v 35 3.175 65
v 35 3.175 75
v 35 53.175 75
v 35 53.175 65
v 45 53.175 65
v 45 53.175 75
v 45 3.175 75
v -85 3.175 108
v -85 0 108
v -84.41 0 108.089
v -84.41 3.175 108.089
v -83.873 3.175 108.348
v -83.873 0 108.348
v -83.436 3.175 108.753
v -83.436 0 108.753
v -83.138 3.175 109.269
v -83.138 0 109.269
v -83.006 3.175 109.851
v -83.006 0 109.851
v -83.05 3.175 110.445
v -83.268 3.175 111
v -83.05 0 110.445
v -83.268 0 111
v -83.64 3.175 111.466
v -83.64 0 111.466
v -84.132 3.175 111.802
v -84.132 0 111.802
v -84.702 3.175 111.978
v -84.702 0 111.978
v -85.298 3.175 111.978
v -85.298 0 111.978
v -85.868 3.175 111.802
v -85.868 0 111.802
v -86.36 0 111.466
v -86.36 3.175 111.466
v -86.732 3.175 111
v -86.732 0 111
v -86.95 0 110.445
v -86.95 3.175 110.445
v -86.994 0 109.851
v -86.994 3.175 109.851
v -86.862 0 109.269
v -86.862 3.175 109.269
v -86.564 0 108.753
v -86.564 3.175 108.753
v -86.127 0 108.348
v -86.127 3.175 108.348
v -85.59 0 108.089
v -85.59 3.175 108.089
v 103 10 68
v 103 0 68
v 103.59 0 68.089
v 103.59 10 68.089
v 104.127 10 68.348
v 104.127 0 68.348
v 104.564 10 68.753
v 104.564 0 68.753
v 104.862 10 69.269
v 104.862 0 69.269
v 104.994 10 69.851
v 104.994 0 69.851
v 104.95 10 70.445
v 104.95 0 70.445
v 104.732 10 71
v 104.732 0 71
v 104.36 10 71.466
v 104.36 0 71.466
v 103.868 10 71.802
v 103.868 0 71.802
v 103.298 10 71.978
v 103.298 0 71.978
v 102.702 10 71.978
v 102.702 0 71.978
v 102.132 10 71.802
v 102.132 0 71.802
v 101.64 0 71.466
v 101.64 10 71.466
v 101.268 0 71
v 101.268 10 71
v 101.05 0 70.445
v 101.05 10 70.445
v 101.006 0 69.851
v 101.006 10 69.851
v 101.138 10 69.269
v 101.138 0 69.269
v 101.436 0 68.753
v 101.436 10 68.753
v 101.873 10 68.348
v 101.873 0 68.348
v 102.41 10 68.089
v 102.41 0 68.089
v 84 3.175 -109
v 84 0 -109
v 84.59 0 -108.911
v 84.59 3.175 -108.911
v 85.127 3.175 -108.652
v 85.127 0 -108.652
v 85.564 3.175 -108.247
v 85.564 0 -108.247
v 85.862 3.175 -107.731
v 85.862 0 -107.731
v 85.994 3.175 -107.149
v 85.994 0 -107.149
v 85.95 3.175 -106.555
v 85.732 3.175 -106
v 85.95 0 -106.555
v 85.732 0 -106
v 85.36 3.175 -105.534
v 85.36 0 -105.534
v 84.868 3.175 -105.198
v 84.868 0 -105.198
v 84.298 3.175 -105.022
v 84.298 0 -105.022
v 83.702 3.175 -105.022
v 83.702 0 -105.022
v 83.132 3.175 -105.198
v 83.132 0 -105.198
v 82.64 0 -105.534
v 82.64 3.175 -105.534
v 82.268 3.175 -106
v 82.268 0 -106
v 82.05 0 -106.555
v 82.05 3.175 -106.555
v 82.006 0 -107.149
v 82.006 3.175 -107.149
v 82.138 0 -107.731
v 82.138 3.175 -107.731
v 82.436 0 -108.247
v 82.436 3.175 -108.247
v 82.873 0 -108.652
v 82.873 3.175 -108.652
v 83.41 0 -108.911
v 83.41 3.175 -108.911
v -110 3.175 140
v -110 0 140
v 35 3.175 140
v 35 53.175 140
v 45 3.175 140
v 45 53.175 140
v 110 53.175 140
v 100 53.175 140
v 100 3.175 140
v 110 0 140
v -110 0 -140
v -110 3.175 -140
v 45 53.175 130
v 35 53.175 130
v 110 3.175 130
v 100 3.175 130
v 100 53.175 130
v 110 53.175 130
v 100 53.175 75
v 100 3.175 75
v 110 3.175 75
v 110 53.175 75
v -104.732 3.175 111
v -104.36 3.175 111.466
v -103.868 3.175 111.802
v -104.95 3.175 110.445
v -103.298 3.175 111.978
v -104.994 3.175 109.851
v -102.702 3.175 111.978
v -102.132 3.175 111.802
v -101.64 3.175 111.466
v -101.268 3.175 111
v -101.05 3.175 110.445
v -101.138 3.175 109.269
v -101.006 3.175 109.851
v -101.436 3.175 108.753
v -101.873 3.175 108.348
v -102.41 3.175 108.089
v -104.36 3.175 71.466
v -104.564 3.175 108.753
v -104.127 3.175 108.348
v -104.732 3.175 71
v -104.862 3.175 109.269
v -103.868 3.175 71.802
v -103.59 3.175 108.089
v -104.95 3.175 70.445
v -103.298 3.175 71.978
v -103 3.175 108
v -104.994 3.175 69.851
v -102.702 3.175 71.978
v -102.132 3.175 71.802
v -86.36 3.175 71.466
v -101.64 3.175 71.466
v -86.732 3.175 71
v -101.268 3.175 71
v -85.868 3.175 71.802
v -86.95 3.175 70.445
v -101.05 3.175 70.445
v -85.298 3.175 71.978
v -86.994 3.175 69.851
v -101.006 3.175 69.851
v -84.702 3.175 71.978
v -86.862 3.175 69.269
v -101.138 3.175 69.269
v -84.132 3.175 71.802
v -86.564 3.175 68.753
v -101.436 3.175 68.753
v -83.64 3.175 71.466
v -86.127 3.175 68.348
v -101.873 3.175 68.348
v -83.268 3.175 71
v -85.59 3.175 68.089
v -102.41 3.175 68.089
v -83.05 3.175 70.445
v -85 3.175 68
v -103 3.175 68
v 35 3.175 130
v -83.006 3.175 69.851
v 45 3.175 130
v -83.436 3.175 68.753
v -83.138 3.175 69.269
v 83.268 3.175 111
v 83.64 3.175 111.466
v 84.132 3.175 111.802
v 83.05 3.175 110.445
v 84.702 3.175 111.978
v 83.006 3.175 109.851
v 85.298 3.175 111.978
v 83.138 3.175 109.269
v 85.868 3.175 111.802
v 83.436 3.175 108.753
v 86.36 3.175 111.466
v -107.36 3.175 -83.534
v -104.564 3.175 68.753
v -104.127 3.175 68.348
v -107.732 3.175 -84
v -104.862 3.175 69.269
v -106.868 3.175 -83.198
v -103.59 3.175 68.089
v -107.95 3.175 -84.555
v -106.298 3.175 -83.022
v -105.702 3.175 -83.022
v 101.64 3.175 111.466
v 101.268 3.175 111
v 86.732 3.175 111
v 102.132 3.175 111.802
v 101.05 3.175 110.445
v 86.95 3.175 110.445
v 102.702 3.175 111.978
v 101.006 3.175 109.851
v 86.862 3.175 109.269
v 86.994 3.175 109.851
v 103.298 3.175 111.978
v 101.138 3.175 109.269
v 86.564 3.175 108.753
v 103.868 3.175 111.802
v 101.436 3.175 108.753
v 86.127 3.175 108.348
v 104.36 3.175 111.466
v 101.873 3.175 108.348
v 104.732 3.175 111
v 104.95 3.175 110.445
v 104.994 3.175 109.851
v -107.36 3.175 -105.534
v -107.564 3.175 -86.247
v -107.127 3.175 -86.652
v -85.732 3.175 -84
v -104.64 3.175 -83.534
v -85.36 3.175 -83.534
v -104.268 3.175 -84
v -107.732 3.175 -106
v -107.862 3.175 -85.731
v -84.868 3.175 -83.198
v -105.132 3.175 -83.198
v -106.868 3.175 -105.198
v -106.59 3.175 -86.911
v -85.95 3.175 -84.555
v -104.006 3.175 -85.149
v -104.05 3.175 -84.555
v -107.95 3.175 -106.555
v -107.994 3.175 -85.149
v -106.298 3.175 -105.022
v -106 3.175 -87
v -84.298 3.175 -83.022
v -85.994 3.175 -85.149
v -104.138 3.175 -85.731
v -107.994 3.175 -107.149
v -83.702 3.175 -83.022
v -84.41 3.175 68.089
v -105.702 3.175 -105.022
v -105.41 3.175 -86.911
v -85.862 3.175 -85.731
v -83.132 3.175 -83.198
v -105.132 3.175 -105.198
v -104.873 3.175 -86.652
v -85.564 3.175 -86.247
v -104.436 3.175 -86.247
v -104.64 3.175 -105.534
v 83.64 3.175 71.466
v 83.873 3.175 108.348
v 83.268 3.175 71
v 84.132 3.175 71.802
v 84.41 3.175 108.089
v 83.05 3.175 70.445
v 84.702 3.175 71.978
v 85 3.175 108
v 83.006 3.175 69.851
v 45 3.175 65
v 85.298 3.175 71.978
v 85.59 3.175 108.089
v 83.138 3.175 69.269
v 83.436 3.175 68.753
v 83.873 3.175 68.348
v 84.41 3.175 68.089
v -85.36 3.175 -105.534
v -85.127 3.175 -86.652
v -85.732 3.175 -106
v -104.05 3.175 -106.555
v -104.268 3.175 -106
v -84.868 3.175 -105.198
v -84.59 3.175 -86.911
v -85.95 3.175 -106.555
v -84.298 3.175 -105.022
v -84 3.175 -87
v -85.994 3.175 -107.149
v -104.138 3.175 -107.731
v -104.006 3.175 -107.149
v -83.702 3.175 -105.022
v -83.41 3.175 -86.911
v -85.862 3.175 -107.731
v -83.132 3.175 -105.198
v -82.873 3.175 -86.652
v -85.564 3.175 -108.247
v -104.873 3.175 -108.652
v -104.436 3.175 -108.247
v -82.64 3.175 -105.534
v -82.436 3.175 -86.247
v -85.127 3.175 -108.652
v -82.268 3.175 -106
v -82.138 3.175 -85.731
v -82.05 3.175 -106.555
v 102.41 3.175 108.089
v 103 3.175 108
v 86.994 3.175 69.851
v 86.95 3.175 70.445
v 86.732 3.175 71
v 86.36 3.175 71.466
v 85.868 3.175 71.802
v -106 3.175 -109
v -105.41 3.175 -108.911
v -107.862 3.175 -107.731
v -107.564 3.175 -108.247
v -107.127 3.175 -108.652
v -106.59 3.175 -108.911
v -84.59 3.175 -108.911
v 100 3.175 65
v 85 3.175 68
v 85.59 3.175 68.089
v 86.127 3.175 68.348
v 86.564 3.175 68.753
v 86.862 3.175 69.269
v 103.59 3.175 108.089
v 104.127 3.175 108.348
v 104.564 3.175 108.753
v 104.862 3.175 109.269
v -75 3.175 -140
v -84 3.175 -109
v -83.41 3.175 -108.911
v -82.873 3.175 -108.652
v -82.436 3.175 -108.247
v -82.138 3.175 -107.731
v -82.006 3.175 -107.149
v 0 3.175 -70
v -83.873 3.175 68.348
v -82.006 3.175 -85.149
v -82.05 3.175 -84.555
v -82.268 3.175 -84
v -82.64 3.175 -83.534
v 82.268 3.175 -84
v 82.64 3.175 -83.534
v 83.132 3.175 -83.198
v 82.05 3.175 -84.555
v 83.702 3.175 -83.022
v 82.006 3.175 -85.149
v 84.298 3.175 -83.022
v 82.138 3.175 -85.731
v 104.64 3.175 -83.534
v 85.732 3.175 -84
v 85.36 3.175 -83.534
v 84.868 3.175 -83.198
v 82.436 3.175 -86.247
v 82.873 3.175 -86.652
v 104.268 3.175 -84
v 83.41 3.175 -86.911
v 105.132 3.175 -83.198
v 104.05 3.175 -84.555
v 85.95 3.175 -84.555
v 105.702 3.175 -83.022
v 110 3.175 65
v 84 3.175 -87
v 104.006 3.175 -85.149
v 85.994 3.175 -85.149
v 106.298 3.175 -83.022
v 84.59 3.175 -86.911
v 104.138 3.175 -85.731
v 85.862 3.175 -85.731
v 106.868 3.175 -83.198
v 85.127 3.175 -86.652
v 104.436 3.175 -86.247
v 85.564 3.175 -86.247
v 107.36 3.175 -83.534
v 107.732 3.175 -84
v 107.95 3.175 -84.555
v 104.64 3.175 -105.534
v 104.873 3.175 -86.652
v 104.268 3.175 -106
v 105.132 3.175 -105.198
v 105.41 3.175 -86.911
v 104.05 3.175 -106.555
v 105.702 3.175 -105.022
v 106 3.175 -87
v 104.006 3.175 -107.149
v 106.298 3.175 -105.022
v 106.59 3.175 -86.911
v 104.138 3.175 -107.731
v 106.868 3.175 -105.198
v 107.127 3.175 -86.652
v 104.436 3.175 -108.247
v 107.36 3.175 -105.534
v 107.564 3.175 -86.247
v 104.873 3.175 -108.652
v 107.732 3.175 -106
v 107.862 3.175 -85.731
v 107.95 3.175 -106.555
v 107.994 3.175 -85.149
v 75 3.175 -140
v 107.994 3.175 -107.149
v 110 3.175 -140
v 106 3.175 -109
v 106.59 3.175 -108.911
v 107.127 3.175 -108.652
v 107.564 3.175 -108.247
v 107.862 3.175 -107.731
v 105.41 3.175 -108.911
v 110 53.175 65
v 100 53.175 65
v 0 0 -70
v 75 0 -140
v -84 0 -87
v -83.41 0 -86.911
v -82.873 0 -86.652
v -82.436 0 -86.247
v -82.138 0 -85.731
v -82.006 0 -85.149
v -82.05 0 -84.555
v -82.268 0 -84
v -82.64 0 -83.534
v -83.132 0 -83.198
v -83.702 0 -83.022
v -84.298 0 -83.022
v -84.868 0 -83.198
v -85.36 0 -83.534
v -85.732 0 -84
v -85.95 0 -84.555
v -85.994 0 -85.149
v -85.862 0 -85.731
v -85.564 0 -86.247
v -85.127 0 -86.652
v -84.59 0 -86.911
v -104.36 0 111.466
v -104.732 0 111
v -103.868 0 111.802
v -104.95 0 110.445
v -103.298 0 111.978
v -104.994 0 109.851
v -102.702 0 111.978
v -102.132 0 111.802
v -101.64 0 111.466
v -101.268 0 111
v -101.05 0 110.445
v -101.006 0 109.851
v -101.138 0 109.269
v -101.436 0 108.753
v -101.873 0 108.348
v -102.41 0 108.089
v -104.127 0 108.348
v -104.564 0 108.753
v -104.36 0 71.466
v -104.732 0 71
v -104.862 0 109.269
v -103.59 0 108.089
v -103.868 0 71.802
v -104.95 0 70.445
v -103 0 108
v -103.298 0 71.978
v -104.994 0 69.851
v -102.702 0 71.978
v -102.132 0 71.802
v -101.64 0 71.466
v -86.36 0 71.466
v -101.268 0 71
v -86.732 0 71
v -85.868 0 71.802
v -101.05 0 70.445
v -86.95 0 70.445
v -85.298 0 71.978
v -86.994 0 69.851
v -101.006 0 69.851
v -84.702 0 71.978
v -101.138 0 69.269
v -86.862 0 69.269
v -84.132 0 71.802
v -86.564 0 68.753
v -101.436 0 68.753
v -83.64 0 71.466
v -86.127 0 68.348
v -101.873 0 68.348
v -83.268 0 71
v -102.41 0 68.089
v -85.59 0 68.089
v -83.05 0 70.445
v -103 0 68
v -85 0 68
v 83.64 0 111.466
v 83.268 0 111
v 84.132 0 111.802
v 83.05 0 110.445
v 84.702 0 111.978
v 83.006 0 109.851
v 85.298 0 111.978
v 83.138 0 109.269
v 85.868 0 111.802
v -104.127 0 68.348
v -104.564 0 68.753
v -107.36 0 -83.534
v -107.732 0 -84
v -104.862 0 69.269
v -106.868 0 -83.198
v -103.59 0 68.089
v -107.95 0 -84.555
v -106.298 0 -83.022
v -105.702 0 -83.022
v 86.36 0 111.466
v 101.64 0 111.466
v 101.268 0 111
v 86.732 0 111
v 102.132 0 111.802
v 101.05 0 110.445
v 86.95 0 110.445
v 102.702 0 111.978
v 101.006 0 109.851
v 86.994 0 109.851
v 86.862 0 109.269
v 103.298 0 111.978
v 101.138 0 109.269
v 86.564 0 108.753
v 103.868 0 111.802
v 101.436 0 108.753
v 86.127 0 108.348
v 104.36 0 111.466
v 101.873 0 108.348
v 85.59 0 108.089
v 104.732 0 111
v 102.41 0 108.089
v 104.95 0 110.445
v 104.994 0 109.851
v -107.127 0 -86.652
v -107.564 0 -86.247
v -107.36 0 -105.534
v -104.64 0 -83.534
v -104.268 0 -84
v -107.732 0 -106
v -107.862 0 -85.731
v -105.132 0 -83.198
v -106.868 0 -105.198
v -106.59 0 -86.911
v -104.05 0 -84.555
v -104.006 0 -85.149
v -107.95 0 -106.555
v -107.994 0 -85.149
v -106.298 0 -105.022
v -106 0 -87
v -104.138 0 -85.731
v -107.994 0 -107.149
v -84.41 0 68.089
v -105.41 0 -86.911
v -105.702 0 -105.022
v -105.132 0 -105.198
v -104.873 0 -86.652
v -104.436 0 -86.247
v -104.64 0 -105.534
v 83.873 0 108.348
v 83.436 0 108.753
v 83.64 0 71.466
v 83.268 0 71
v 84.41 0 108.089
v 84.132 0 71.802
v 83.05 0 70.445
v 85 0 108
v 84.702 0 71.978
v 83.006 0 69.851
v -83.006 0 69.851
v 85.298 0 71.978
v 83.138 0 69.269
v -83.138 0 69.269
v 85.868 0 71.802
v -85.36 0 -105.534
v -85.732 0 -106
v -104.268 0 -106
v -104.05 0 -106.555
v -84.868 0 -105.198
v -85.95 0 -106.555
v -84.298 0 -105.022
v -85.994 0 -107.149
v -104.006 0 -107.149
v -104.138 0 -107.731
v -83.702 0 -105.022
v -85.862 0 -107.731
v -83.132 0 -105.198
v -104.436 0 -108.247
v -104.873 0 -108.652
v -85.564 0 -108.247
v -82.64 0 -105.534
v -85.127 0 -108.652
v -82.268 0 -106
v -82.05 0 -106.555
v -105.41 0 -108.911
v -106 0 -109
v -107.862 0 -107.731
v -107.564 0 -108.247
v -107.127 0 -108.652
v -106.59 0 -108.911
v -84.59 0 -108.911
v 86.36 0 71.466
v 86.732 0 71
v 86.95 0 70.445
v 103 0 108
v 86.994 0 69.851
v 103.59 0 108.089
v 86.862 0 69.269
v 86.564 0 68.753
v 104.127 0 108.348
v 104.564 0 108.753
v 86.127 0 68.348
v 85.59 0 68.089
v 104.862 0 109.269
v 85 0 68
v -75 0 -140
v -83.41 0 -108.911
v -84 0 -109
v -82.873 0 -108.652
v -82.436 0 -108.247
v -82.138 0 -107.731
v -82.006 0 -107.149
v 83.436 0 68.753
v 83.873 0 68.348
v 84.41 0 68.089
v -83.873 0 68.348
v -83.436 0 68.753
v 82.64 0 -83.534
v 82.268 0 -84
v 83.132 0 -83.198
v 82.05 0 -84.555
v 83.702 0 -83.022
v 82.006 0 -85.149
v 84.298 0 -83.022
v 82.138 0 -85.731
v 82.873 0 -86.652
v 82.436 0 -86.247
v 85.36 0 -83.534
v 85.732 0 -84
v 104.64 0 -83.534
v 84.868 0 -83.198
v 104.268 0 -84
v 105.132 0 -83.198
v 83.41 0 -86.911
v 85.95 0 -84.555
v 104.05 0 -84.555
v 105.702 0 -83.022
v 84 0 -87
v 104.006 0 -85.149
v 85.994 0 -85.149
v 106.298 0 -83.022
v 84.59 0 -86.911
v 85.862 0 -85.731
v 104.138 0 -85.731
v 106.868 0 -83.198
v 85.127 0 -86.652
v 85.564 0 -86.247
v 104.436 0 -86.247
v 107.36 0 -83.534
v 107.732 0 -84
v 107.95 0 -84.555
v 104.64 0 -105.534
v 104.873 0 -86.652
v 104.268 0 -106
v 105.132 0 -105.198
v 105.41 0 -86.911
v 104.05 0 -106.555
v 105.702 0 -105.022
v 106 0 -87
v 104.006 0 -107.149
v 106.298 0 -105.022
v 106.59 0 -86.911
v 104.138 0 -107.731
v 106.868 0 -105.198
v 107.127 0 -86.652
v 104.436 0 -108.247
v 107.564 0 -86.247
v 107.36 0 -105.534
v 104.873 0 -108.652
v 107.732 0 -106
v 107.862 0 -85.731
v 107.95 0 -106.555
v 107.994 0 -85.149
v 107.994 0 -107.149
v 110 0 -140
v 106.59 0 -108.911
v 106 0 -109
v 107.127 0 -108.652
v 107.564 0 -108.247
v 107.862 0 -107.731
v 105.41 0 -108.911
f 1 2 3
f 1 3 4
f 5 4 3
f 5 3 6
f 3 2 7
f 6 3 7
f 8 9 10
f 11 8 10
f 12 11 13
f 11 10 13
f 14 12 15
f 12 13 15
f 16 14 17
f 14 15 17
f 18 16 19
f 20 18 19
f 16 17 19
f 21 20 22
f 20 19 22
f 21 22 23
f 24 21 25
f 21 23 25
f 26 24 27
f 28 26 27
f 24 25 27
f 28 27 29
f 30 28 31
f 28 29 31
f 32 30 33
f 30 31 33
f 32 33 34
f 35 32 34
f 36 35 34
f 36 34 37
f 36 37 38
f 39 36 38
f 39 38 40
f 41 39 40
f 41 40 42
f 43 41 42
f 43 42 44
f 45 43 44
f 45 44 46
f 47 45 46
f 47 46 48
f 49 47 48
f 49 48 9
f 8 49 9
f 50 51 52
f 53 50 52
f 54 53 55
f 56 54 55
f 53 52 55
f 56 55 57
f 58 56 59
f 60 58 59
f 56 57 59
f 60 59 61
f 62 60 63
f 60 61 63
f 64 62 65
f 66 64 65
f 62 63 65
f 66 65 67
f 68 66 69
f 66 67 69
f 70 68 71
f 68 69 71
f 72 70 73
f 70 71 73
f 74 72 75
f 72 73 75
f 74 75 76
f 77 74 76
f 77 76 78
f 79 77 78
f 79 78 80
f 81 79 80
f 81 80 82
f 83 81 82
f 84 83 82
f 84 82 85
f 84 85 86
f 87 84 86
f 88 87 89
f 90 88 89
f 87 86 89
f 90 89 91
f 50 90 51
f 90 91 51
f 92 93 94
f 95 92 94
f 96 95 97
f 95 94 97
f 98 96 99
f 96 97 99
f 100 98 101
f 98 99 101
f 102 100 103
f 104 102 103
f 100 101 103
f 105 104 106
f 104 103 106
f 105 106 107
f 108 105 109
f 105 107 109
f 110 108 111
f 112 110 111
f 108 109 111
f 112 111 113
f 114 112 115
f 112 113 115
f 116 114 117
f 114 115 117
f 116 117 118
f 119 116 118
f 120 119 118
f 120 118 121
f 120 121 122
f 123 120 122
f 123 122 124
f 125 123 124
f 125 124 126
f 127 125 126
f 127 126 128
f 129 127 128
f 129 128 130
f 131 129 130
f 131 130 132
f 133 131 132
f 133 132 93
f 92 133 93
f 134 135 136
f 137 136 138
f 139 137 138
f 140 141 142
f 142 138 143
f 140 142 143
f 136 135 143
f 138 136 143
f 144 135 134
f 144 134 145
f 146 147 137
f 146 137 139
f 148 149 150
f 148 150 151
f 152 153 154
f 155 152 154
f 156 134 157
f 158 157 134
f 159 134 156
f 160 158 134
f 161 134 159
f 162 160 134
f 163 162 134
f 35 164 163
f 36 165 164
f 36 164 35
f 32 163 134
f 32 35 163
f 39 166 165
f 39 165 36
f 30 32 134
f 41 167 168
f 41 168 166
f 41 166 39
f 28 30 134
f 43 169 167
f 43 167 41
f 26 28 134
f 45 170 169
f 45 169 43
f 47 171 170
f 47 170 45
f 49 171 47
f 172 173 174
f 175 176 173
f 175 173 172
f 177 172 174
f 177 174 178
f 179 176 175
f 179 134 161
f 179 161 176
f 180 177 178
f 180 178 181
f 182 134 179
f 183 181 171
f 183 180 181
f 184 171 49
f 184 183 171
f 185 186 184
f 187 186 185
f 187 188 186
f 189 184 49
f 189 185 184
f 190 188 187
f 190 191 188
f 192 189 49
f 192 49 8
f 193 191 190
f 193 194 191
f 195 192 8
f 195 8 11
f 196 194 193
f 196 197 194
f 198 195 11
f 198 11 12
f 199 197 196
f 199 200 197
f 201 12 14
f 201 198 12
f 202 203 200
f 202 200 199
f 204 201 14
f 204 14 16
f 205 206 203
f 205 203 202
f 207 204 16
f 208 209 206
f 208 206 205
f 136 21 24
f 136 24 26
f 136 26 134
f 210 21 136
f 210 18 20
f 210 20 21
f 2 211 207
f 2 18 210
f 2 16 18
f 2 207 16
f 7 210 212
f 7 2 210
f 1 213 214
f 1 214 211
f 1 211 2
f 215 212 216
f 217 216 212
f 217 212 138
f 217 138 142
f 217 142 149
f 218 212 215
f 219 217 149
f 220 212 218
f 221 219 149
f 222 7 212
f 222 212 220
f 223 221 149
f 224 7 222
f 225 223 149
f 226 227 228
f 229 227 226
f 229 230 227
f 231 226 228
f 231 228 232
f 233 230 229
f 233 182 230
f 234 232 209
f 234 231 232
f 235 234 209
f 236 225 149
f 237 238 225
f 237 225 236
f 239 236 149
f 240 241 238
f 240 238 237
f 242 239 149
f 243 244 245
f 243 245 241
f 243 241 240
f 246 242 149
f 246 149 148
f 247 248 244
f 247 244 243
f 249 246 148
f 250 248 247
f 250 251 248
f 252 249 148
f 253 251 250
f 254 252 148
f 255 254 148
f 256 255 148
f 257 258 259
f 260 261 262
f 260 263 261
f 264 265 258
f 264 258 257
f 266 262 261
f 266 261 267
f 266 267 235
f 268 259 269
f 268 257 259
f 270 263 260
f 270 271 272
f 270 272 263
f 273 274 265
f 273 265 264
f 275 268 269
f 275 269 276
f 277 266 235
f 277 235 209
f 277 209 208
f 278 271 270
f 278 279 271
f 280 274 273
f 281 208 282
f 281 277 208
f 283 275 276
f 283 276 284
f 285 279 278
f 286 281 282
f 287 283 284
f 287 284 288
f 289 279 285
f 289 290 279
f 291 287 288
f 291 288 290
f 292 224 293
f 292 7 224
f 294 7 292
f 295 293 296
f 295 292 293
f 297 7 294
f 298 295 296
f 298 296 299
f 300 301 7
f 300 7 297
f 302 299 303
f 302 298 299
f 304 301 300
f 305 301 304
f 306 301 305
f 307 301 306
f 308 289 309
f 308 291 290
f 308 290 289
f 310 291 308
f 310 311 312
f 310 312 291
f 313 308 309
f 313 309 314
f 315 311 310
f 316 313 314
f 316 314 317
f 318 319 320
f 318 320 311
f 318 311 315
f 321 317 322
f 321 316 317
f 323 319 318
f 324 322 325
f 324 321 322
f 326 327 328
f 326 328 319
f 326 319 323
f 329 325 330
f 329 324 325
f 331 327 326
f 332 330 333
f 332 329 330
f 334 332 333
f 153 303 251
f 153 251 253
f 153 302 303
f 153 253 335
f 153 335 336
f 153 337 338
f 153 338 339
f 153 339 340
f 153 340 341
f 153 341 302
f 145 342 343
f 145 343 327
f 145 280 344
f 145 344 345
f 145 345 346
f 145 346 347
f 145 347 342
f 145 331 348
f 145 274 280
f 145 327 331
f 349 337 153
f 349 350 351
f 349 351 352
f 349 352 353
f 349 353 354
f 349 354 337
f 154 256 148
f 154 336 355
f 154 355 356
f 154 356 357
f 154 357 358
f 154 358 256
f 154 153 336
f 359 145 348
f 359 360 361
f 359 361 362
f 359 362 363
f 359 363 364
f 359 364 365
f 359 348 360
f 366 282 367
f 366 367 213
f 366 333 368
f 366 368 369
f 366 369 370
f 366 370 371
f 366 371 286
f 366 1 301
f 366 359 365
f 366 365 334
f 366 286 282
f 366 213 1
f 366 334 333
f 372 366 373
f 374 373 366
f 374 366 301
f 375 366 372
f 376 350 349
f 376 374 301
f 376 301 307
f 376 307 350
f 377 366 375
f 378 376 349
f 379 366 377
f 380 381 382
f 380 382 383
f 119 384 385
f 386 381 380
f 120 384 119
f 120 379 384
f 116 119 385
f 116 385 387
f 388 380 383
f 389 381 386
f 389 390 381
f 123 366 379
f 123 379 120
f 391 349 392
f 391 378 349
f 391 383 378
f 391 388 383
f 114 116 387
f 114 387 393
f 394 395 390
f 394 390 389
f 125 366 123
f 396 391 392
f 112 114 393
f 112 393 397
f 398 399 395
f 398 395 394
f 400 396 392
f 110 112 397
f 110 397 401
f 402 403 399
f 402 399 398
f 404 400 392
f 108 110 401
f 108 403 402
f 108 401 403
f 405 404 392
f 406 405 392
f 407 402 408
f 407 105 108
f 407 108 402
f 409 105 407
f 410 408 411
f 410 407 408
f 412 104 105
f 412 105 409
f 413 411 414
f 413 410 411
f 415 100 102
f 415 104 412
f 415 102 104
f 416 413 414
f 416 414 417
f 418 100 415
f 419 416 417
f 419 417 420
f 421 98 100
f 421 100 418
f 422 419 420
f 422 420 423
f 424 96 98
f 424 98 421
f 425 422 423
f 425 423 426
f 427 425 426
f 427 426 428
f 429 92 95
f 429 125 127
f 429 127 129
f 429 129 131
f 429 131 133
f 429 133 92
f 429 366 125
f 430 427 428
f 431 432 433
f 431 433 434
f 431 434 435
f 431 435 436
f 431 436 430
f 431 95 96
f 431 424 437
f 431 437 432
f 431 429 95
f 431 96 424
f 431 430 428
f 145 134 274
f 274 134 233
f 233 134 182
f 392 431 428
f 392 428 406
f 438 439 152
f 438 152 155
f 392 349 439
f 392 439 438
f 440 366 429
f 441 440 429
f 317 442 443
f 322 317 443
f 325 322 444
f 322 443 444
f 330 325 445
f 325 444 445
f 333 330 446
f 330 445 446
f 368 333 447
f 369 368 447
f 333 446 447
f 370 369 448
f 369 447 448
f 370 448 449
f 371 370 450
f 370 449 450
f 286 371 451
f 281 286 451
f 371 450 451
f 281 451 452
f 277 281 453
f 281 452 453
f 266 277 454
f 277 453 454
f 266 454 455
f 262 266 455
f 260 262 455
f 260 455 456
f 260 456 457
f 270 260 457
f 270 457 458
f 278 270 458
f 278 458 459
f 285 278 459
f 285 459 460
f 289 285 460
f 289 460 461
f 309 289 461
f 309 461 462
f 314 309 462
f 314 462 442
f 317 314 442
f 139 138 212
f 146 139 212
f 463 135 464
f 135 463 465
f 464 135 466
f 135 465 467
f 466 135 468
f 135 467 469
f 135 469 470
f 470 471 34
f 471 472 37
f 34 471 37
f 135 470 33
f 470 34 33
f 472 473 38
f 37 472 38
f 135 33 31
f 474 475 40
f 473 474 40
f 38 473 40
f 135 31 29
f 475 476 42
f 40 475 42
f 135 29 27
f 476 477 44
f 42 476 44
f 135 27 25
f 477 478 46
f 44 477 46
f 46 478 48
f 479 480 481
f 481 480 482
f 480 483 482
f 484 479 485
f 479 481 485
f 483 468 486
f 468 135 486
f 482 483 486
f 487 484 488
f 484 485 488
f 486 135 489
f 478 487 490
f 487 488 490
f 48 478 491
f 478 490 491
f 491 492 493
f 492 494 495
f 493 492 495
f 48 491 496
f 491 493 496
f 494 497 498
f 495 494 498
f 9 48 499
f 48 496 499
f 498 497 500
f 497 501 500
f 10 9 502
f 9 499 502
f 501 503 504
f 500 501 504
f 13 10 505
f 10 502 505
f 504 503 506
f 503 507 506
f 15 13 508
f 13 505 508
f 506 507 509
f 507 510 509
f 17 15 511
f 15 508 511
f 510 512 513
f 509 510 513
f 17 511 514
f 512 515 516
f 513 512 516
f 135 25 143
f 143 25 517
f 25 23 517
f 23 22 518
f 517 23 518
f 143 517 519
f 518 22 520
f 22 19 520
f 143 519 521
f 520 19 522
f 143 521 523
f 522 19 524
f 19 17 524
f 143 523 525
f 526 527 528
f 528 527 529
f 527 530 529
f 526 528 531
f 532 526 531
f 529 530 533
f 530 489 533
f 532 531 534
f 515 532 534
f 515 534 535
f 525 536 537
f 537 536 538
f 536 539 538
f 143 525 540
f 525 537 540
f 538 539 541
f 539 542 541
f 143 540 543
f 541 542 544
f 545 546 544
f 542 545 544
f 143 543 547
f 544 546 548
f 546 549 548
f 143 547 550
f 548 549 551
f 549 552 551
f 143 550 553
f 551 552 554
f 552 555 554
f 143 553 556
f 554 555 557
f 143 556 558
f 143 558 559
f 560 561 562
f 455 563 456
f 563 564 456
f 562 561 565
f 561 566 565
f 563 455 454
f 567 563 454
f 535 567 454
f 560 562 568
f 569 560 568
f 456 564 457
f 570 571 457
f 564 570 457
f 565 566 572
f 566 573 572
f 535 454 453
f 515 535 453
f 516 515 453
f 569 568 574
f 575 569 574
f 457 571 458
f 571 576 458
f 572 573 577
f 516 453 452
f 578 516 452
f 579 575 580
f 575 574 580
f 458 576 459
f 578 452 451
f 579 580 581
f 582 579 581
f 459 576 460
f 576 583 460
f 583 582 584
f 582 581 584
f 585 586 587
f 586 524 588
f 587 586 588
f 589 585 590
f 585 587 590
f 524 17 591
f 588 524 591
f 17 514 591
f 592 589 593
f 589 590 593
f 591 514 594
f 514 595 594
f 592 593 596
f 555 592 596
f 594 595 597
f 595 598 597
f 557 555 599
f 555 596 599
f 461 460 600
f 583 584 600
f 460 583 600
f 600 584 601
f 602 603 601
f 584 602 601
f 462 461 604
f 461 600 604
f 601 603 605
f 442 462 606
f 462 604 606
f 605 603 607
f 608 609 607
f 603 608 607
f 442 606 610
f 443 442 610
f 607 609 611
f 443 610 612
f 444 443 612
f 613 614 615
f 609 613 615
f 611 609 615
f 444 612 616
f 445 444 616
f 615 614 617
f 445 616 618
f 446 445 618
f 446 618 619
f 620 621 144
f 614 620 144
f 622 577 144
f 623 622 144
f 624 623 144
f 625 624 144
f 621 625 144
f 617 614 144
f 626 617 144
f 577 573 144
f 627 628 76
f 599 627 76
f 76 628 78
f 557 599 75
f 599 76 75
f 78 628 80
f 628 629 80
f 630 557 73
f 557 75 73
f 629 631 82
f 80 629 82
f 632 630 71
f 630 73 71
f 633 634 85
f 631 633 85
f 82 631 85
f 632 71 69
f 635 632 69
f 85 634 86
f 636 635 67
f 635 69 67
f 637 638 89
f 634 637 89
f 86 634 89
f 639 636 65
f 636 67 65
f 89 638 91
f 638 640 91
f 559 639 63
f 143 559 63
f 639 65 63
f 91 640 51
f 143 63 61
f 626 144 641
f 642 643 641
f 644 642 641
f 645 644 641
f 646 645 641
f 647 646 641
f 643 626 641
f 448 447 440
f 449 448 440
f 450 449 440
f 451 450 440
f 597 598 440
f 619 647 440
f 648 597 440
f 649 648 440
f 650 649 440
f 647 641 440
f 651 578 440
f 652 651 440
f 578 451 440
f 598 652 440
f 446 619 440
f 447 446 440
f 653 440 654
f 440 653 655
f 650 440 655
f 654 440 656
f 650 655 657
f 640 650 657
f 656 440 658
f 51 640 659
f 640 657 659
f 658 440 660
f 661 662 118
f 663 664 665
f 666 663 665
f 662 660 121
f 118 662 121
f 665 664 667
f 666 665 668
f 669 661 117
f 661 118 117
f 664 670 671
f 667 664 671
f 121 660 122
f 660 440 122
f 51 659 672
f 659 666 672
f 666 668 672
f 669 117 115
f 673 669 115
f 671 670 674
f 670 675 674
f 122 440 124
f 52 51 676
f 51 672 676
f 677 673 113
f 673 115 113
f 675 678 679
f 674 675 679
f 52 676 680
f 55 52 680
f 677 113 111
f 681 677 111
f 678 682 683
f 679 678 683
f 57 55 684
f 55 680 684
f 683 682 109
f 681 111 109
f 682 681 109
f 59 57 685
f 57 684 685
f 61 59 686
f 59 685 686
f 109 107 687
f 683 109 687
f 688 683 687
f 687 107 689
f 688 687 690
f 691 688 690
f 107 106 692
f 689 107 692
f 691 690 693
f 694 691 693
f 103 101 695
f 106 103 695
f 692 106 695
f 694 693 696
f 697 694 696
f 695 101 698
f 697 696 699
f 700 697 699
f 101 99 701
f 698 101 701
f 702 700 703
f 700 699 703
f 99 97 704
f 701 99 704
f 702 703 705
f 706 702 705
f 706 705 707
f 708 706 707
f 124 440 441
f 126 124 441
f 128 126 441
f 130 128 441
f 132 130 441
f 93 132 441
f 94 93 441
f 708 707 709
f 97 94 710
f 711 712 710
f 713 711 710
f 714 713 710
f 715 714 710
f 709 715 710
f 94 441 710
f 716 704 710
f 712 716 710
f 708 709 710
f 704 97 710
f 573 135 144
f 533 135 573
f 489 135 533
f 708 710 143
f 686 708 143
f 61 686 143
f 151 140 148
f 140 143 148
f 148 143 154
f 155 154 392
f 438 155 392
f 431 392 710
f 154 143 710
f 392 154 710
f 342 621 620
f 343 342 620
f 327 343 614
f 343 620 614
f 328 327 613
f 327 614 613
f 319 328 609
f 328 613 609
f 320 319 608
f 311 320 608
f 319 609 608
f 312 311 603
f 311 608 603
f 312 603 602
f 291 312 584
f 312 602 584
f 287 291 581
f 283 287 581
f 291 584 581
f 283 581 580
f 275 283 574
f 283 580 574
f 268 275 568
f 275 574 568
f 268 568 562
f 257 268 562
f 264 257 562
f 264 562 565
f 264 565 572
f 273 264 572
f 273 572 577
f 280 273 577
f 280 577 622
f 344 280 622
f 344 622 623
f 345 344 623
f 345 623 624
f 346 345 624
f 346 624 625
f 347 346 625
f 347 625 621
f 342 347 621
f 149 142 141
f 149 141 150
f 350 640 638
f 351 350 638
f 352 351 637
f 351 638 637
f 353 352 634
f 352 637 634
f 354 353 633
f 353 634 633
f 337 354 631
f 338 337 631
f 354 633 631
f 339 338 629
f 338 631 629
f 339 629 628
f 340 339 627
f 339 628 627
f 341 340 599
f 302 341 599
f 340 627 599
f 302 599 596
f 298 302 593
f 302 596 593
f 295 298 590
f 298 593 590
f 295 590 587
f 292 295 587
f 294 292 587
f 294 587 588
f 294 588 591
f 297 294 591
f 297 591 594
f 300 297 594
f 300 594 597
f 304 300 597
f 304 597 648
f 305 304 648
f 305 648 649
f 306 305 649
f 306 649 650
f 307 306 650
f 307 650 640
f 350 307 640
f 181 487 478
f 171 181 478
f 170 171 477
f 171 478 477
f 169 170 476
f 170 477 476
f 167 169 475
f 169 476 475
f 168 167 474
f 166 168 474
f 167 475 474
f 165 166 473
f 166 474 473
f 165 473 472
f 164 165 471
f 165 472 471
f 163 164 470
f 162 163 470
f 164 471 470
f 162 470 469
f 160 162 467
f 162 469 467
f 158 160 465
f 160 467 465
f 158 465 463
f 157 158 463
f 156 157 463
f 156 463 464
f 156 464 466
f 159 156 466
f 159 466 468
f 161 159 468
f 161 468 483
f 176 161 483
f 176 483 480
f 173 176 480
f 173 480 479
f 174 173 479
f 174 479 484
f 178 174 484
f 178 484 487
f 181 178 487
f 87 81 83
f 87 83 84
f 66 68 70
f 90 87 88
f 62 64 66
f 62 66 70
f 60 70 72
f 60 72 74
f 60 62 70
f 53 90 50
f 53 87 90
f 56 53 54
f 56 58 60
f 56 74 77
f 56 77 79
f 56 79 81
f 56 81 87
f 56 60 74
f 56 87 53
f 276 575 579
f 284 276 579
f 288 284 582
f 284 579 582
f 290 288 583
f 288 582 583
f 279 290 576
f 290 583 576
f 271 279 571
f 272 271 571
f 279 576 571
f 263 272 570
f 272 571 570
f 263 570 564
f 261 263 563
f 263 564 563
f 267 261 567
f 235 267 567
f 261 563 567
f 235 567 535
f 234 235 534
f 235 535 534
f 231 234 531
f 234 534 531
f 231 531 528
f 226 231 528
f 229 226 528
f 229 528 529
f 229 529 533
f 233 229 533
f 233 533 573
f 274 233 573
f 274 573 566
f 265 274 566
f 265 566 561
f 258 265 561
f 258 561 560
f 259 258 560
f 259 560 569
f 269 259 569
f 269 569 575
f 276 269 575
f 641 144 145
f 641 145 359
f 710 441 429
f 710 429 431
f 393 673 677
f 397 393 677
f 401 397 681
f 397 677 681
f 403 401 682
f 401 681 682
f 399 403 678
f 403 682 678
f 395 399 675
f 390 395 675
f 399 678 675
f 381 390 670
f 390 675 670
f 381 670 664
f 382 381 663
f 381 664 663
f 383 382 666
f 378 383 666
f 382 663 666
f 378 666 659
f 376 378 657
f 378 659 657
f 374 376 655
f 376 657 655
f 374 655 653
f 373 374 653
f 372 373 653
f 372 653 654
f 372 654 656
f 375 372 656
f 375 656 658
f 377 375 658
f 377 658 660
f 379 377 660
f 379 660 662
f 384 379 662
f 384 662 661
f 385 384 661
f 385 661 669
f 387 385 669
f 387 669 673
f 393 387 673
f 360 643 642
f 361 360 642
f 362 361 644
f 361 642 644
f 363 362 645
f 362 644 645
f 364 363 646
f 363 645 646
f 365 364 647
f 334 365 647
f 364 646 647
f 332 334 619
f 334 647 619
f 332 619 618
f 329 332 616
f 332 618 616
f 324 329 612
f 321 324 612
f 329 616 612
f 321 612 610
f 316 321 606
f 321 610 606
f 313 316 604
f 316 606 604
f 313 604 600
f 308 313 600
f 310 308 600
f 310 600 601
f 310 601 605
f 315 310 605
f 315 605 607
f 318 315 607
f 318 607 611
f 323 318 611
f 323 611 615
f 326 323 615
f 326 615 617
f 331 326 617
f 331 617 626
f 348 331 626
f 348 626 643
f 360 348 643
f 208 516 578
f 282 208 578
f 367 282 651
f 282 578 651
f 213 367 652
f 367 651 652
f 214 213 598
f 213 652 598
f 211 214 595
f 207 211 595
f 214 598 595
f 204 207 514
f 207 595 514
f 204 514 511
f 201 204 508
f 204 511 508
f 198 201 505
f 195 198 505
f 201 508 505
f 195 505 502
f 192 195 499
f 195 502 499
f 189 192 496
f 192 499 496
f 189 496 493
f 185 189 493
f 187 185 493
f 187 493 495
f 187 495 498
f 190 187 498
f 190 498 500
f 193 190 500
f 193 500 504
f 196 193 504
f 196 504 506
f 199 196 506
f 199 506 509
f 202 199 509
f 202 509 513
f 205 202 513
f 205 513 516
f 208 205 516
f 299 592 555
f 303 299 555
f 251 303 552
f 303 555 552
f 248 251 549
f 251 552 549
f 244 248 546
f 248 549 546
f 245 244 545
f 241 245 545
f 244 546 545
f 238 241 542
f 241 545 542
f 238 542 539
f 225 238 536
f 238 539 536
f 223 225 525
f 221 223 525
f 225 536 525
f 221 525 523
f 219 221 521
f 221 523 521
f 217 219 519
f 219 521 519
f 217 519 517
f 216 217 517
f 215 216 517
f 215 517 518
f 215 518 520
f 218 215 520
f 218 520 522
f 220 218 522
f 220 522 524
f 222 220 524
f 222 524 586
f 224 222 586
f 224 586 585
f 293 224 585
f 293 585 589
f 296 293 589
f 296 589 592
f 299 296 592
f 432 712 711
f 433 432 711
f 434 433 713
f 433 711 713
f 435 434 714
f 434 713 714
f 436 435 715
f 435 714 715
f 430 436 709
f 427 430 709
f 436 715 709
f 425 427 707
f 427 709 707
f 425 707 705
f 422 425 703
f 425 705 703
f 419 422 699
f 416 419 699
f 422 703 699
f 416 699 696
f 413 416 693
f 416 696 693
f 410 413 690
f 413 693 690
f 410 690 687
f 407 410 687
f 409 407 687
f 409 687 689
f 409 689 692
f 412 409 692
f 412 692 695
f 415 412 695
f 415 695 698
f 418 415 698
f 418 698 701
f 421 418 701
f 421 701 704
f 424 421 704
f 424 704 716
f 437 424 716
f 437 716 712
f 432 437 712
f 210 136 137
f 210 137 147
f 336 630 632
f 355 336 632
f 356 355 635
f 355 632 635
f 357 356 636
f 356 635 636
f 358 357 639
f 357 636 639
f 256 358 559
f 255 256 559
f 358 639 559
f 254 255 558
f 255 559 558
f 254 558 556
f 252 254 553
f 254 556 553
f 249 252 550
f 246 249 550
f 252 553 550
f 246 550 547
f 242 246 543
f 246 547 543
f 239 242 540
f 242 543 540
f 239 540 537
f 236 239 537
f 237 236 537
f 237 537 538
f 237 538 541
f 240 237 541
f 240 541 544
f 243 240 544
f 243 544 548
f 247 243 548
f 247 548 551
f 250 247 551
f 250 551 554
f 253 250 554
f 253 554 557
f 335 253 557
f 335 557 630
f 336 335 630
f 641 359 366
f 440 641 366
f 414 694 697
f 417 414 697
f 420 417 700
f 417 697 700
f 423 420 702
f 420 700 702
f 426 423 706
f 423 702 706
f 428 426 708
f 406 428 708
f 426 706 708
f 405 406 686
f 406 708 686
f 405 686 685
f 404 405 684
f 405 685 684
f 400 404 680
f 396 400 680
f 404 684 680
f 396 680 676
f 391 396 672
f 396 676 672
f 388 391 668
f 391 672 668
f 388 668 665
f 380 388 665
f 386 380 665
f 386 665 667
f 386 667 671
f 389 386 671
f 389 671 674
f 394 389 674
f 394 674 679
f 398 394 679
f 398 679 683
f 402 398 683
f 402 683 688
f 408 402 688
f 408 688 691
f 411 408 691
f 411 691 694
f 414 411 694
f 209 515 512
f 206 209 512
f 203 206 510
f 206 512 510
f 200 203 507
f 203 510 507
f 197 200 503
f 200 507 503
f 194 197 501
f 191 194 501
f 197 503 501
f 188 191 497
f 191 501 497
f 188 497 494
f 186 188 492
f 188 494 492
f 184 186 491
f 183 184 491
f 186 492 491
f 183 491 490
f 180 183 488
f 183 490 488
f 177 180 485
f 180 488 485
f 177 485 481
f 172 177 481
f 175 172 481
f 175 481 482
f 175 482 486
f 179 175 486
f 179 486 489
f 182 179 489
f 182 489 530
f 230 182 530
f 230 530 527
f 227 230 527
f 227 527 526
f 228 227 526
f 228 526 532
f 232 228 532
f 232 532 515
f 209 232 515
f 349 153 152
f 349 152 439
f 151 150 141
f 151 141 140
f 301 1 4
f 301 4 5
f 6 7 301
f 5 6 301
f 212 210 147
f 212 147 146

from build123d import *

# Parameters (mm, degrees)
SKETCH3_W           = 220
SKETCH3_H           = 280
BOSS_EXTRUDE1_DEPTH = 3.175
SKETCH4_W           = 10
SKETCH4_H           = 10
BOSS_EXTRUDE2_DEPTH = 50
SKETCH7_R           = 2
SKETCH7_R_2         = 2.000000006
SKETCH7_R_3         = 1.999999994
CUT_EXTRUDE2_DEPTH  = 10
CUT_EXTRUDE4_DEPTH  = 10


with BuildPart() as part:
    # Sketch3 → Boss-Extrude1 (new body)
    with BuildSketch(Plane(origin=(0, 0, 0), x_dir=(1, 0, 0), z_dir=(0, 1, 0))):
        Rectangle(SKETCH3_W, SKETCH3_H)
    extrude(amount=BOSS_EXTRUDE1_DEPTH)

    # Sketch4 → Boss-Extrude2 (add)
    with BuildSketch(Plane(origin=(0, 3.175, 0), x_dir=(1, 0, 0), z_dir=(0, 1, 0))):
        with Locations((105, -135)):
            Rectangle(SKETCH4_W, SKETCH4_H)
        with Locations((105, -70)):
            Rectangle(SKETCH4_W, SKETCH4_H)
        with Locations((40, -135)):
            Rectangle(SKETCH4_W, SKETCH4_H)
        with Locations((40, -70)):
            Rectangle(SKETCH4_W, SKETCH4_H)
    extrude(amount=BOSS_EXTRUDE2_DEPTH)

    # Sketch7 → Cut-Extrude2 (cut)
    with BuildSketch(Plane.XZ):
        with Locations(Location((-103, 70, 0), (0, 0, 270))):
            Circle(SKETCH7_R)
        with Locations(Location((-103, 110, 0), (0, 0, 270))):
            Circle(SKETCH7_R)
        with Locations(Location((-85, 110, 0), (0, 0, 270))):
            Circle(SKETCH7_R_2)
        with Locations(Location((-85, 70, 0), (0, 0, 270))):
            Circle(SKETCH7_R)
        with Locations(Location((85, 110, 0), (0, 0, 270))):
            Circle(SKETCH7_R_3)
        with Locations(Location((103, 110, 0), (0, 0, 270))):
            Circle(SKETCH7_R)
        with Locations(Location((103, 70, 0), (0, 0, 270))):
            Circle(SKETCH7_R)
        with Locations(Location((85, 70, 0), (0, 0, 270))):
            Circle(SKETCH7_R)
        with Locations(Location((106, -107, 0), (0, 0, 270))):
            Circle(SKETCH7_R)
        with Locations(Location((84, -85, 0), (0, 0, 270))):
            Circle(SKETCH7_R)
        with Locations(Location((106, -85, 0), (0, 0, 270))):
            Circle(SKETCH7_R)
        with Locations(Location((84, -107, 0), (0, 0, 270))):
            Circle(SKETCH7_R)
        with Locations(Location((-84, -107, 0), (0, 0, 270))):
            Circle(SKETCH7_R)
        with Locations(Location((-106, -107, 0), (0, 0, 270))):
            Circle(SKETCH7_R)
        with Locations(Location((-106, -85, 0), (0, 0, 270))):
            Circle(SKETCH7_R)
        with Locations(Location((-84, -85, 0), (0, 0, 270))):
            Circle(SKETCH7_R)
    extrude(amount=-CUT_EXTRUDE2_DEPTH, mode=Mode.SUBTRACT)

    # Sketch9 → Cut-Extrude4 (cut)
    with BuildSketch(Plane(origin=(0, 3.175, 0), x_dir=(1, 0, 0), z_dir=(0, 1, 0))):
        Polygon((0, 70), (75, 140), (-75, 140), align=None)
    extrude(amount=-CUT_EXTRUDE4_DEPTH, mode=Mode.SUBTRACT)


solid = part.part
